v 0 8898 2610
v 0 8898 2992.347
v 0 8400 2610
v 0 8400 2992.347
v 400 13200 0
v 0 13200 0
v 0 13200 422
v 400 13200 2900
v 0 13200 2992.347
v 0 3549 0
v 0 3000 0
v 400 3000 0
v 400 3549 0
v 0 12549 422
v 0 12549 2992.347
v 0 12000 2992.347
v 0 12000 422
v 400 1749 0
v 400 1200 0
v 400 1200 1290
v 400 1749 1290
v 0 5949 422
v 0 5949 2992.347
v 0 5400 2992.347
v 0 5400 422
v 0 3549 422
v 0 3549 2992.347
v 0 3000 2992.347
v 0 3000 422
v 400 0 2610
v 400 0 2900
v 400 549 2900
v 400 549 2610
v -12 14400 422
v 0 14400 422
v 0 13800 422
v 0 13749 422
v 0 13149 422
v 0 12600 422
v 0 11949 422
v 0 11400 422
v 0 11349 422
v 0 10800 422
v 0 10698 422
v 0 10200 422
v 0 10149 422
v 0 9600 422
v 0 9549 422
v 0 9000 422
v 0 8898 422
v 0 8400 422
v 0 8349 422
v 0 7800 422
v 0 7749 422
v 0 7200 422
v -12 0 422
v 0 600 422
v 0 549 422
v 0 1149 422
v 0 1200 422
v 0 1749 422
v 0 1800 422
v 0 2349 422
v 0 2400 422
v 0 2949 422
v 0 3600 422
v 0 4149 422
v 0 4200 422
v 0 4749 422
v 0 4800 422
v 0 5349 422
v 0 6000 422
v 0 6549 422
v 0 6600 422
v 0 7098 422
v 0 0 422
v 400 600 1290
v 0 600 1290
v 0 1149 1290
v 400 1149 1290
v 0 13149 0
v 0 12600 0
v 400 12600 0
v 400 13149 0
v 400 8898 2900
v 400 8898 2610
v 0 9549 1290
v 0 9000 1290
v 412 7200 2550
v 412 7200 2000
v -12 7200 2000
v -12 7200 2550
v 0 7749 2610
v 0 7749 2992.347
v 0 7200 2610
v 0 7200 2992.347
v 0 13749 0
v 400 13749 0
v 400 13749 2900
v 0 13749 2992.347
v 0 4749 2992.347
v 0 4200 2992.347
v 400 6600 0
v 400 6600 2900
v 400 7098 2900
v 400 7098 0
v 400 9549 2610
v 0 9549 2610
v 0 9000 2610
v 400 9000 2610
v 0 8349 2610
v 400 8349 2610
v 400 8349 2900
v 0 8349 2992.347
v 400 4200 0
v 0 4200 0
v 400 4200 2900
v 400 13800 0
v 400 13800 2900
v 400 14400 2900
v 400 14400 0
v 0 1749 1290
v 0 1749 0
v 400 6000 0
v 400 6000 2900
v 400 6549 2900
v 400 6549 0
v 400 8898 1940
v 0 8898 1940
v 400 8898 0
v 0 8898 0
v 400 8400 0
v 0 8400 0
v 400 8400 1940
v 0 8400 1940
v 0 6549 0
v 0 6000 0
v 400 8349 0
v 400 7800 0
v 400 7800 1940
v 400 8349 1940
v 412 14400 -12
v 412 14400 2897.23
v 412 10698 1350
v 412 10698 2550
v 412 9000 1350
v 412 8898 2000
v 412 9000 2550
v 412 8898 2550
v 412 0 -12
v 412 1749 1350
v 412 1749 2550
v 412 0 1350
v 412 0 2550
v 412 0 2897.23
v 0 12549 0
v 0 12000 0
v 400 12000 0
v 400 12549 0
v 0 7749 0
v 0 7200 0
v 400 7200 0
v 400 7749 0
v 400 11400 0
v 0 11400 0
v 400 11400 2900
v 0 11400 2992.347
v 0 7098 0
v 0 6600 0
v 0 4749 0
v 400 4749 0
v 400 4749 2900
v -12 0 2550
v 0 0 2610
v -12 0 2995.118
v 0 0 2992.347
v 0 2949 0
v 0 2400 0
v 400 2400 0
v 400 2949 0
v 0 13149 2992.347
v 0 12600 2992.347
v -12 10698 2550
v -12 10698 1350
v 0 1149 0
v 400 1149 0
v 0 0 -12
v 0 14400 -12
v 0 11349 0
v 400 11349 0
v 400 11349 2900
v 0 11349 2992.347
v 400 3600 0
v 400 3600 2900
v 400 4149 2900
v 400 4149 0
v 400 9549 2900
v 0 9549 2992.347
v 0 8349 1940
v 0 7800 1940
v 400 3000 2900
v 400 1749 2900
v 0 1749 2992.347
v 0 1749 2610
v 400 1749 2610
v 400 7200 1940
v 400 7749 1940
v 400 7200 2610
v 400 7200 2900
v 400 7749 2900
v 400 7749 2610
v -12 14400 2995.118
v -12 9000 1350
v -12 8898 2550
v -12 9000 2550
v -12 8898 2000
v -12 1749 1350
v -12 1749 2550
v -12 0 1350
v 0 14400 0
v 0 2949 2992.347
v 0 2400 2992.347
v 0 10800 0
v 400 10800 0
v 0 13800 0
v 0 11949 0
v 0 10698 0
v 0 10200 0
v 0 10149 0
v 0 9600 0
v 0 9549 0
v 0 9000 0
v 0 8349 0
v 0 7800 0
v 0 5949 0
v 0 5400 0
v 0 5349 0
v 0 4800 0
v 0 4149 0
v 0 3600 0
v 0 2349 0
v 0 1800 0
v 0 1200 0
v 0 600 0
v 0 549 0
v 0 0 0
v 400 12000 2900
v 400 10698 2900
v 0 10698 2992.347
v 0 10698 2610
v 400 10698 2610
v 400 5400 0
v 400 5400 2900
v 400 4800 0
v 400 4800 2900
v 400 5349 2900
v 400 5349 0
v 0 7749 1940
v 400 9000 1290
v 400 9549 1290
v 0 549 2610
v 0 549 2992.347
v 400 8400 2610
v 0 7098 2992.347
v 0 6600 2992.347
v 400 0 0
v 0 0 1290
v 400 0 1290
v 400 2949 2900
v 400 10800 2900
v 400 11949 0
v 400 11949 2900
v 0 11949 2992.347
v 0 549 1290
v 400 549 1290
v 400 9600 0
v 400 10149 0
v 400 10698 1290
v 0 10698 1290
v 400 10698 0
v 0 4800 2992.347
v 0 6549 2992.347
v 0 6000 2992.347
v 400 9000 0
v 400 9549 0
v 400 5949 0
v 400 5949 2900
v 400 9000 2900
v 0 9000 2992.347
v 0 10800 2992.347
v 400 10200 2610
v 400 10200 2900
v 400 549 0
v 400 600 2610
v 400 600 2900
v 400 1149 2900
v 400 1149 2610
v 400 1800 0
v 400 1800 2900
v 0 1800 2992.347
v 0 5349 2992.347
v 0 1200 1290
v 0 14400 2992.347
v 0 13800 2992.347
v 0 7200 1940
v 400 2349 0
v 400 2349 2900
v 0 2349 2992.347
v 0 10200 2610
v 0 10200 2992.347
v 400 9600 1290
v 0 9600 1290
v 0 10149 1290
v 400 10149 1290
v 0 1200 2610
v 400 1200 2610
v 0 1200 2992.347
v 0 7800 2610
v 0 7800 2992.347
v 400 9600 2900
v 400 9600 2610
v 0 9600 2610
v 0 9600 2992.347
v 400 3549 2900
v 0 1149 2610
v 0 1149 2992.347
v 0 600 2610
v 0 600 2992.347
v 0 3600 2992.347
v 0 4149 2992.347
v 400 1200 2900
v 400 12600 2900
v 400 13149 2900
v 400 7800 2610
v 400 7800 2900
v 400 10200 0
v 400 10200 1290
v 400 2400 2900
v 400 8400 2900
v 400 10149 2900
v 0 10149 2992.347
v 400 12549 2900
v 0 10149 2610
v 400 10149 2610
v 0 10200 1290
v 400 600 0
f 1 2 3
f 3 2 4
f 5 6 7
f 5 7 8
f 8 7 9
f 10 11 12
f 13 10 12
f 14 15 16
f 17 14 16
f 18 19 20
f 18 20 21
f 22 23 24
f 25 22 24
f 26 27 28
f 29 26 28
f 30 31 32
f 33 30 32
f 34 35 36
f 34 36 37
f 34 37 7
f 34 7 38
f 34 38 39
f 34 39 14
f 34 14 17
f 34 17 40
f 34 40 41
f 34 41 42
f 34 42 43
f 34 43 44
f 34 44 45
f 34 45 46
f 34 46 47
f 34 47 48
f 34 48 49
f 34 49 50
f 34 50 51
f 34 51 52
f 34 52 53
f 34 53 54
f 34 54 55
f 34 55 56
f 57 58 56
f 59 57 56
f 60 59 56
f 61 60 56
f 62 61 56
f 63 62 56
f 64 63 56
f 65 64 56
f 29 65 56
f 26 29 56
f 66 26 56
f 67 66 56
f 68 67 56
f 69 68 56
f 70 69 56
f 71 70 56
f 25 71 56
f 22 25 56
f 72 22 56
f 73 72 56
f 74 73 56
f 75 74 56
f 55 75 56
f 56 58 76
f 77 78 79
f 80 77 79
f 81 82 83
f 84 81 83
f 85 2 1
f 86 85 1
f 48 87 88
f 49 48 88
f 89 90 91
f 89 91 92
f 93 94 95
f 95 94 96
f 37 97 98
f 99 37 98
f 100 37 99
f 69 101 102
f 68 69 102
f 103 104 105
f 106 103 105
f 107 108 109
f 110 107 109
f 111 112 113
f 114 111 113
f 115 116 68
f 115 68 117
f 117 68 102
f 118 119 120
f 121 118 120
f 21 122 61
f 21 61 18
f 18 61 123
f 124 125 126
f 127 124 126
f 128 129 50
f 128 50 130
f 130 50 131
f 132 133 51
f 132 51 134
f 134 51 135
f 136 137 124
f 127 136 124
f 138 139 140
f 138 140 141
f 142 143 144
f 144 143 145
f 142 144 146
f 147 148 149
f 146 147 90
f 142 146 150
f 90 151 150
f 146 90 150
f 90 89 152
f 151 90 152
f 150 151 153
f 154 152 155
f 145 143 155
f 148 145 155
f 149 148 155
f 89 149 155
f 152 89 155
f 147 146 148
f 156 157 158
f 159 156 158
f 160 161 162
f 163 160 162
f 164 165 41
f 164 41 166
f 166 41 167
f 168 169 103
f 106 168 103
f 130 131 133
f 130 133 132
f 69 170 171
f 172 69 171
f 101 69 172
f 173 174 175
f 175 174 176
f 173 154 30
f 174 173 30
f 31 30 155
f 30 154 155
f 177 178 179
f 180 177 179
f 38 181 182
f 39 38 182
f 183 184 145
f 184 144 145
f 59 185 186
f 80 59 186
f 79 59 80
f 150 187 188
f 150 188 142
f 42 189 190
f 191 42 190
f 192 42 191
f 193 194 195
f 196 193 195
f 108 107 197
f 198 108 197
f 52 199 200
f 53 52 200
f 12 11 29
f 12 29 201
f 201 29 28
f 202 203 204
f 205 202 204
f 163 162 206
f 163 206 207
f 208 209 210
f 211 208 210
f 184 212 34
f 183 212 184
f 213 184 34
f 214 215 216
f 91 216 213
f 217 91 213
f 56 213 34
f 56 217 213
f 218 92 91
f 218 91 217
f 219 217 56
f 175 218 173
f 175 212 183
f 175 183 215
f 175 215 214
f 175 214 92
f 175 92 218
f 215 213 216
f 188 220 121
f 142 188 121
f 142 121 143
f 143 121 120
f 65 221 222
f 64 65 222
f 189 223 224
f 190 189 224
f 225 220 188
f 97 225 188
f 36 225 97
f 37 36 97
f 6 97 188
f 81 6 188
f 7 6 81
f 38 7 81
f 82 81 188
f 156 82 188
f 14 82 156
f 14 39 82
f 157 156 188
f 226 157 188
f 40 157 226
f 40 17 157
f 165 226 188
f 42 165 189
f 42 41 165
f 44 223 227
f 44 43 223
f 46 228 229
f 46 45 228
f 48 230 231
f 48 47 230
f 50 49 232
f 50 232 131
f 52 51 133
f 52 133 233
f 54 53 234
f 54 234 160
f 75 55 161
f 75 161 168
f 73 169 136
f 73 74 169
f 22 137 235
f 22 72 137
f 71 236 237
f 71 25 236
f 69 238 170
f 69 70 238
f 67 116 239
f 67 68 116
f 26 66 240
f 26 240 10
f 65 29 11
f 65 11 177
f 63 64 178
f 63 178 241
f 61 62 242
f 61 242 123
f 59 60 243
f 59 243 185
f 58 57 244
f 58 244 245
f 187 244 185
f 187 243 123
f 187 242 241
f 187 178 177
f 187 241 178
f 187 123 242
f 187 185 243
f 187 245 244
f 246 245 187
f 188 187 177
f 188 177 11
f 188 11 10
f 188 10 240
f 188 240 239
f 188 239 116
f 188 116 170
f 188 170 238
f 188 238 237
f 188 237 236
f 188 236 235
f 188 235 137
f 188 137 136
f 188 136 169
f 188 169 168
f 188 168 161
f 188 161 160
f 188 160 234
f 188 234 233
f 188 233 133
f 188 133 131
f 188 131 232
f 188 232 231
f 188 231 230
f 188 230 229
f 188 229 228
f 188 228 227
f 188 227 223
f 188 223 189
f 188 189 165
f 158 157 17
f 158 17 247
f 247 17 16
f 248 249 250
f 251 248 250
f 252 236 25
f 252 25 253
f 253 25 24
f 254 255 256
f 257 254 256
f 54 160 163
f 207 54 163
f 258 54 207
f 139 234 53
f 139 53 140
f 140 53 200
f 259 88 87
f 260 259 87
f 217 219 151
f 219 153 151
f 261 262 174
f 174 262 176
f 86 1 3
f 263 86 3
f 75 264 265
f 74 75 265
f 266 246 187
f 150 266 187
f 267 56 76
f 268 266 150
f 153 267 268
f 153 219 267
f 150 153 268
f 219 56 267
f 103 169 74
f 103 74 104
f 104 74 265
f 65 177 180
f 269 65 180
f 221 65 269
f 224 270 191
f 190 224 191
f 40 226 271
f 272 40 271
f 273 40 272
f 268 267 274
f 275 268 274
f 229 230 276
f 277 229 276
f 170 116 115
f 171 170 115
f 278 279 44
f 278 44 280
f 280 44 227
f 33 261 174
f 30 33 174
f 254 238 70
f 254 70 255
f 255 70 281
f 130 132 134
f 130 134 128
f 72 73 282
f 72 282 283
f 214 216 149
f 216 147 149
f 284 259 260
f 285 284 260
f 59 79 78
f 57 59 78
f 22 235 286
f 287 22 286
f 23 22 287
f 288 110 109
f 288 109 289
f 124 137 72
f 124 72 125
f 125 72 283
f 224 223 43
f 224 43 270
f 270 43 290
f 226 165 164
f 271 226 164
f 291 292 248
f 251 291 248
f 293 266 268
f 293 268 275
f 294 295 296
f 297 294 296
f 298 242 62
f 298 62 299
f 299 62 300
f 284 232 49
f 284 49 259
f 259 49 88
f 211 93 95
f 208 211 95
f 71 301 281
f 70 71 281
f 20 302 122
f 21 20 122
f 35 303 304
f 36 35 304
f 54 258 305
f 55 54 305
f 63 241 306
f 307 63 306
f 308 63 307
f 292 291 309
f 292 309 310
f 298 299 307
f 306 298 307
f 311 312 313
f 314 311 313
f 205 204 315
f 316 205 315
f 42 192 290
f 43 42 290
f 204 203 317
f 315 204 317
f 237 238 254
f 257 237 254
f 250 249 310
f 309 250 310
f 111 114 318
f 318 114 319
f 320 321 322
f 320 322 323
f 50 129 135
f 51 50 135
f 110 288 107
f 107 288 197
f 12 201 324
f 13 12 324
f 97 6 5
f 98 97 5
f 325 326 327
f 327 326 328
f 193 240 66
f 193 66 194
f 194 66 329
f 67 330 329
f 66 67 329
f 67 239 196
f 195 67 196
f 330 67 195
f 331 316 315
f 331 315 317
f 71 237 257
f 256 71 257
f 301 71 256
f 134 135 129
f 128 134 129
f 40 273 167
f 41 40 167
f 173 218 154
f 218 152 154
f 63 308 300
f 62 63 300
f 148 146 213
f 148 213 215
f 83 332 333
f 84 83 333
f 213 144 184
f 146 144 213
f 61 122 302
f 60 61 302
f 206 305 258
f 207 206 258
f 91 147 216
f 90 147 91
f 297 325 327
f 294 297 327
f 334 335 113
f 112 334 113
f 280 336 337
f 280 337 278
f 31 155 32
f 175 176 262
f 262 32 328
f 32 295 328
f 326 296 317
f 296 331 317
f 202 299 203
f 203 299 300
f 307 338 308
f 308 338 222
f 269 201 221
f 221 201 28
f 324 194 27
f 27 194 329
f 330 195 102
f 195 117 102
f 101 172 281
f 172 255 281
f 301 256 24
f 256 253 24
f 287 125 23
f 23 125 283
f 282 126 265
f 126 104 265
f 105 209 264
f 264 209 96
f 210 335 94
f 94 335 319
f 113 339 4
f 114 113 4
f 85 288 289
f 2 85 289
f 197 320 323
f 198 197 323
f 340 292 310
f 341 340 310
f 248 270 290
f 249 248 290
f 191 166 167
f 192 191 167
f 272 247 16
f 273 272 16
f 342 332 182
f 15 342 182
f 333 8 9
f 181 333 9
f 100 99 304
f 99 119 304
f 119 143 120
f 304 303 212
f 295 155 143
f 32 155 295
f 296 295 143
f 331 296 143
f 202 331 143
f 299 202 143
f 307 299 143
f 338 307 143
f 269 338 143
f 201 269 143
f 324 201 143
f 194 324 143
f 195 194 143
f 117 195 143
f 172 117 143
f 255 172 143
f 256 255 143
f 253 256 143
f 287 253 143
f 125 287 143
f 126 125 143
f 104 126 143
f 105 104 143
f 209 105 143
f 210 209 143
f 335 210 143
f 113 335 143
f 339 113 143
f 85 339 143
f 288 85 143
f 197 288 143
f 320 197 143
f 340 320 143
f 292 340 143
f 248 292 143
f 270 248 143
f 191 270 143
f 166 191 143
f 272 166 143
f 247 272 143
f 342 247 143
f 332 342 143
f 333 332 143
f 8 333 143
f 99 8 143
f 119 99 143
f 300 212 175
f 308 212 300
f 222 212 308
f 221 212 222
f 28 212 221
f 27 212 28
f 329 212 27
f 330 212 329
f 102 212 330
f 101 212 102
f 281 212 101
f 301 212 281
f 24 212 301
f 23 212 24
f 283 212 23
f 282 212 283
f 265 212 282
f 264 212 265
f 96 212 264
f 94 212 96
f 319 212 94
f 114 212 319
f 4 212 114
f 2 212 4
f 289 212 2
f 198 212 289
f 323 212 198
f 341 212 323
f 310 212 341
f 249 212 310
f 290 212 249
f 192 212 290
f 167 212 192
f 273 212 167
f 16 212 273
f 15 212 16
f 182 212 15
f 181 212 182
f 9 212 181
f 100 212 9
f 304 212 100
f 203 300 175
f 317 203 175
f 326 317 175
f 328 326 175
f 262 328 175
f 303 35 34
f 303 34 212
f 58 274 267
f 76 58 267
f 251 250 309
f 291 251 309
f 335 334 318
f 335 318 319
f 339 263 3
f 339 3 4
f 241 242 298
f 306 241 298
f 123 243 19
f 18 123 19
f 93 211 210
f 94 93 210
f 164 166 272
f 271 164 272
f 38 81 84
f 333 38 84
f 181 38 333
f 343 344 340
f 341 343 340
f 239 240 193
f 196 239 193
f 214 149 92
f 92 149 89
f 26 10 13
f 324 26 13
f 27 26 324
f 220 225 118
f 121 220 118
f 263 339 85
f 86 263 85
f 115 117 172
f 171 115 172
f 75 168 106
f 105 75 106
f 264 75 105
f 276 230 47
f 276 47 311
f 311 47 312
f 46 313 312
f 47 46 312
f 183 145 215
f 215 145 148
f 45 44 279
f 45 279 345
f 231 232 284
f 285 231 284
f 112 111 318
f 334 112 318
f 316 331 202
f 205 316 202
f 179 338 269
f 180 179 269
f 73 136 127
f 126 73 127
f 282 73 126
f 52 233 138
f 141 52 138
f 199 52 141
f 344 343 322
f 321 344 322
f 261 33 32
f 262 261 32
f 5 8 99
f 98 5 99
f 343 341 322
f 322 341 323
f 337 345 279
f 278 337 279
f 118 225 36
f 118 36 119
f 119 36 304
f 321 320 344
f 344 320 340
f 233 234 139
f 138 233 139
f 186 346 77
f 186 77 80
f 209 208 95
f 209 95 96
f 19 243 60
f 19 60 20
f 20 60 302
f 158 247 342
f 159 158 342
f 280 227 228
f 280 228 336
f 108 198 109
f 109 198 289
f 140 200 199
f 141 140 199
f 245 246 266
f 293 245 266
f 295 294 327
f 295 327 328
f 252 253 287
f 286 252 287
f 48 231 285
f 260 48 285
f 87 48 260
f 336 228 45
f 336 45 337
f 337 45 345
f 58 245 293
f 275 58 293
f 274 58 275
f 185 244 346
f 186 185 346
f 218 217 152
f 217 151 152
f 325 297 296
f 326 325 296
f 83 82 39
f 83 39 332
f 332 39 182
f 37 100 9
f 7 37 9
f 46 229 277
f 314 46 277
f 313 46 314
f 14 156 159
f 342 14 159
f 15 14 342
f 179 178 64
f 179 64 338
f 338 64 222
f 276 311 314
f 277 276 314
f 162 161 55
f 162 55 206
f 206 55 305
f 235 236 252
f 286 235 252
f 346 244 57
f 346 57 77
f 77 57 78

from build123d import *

# Parameters (mm, degrees)
F0_W     = 51
F0_H     = 590
F0_H_2   = 1290
F1_DEPTH = 400
F0_H_3   = 3200
F0_H_4   = 1940
F2_W     = 549
F2_H     = 590
F2_H_2   = 1290
F2_W_2   = 12600
F2_H_3   = 3200
F2_W_3   = 1698
F2_H_4   = 1200
F2_H_5   = 550
F3_DEPTH = 12
F4_W     = 12600
F4_H     = 2778
F4_W_2   = 1698
F4_H_2   = 1200
F4_H_3   = 550
F4_W_3   = 549
F4_H_4   = 590
F4_H_5   = 868
F5_DEPTH = 12
F7_DEPTH = 14400.001
F8_W     = 412
F8_H     = 14400
F9_DEPTH = 12


# Not quite as in the source:
# - a feature names something its author has since deleted; it is built from what else it names


with BuildPart() as f1:
    # F0 (on Right) → F1 (new body)
    with BuildSketch(Plane.YZ):
        with Locations((574.5, 2905)):
            Rectangle(F0_W, F0_H)
        with Locations((1174.5, 2905)):
            Rectangle(F0_W, F0_H)
        Polygon((1749, 2550), (1749, 1350), (1749, 1290), (1749, 0), (1800, 0), (1800, 3200), (1749, 3200), (1749, 2610), align=None)
        Polygon((0, 2610), (0, 2550), (1740, 2550), (1749, 2550), (1749, 2610), (1200, 2610), (1149, 2610), (600, 2610), (549, 2610), align=None)
        Polygon((0, 1350), (0, 1290), (549, 1290), (600, 1290), (1149, 1290), (1200, 1290), (1749, 1290), (1749, 1350), (1740, 1350), align=None)
        with Locations((1174.5, 645)):
            Rectangle(F0_W, F0_H_2)
        with Locations((574.5, 645)):
            Rectangle(F0_W, F0_H_2)
    extrude(amount=F1_DEPTH)



with BuildPart() as f1b:
    # F0 (on Right) → F1, piece 2 (new body)
    with BuildSketch(Plane.YZ):
        with Locations((2374.5, 1600)):
            Rectangle(F0_W, F0_H_3)
    extrude(amount=F1_DEPTH)


with BuildPart() as f1c:
    # F0 (on Right) → F1, piece 3 (new body)
    with BuildSketch(Plane.YZ):
        with Locations((2974.5, 1600)):
            Rectangle(F0_W, F0_H_3)
    extrude(amount=F1_DEPTH)


with BuildPart() as f1d:
    # F0 (on Right) → F1, piece 4 (new body)
    with BuildSketch(Plane.YZ):
        with Locations((3574.5, 1600)):
            Rectangle(F0_W, F0_H_3)
    extrude(amount=F1_DEPTH)


with BuildPart() as f1e:
    # F0 (on Right) → F1, piece 5 (new body)
    with BuildSketch(Plane.YZ):
        with Locations((4174.5, 1600)):
            Rectangle(F0_W, F0_H_3)
    extrude(amount=F1_DEPTH)


with BuildPart() as f1f:
    # F0 (on Right) → F1, piece 6 (new body)
    with BuildSketch(Plane.YZ):
        with Locations((4774.5, 1600)):
            Rectangle(F0_W, F0_H_3)
    extrude(amount=F1_DEPTH)


with BuildPart() as f1g:
    # F0 (on Right) → F1, piece 7 (new body)
    with BuildSketch(Plane.YZ):
        with Locations((5374.5, 1600)):
            Rectangle(F0_W, F0_H_3)
    extrude(amount=F1_DEPTH)


with BuildPart() as f1h:
    # F0 (on Right) → F1, piece 8 (new body)
    with BuildSketch(Plane.YZ):
        with Locations((5974.5, 1600)):
            Rectangle(F0_W, F0_H_3)
    extrude(amount=F1_DEPTH)


with BuildPart() as f1i:
    # F0 (on Right) → F1, piece 9 (new body)
    with BuildSketch(Plane.YZ):
        with Locations((6574.5, 1600)):
            Rectangle(F0_W, F0_H_3)
    extrude(amount=F1_DEPTH)


with BuildPart() as f1j:
    # F0 (on Right) → F1, piece 10 (new body)
    with BuildSketch(Plane.YZ):
        with Locations((7774.5, 2905)):
            Rectangle(F0_W, F0_H)
        with Locations((8374.5, 2905)):
            Rectangle(F0_W, F0_H)
        with Locations((9574.5, 2905)):
            Rectangle(F0_W, F0_H)
        with Locations((10174.5, 2905)):
            Rectangle(F0_W, F0_H)
        with Locations((10774.5, 1600)):
            Rectangle(F0_W, F0_H_3)
        Polygon((7149, 3200), (7149, 0), (7200, 0), (7200, 1940), (7749, 1940), (7800, 1940), (8349, 1940), (8400, 1940), (8898, 1940), (8898, 2000), (7200, 2000), (7200, 2550), (7200, 2610), (7200, 3200), align=None)
        with Locations((7774.5, 970)):
            Rectangle(F0_W, F0_H_4)
        Polygon((9549, 2610), (9000, 2610), (9000, 2550), (10698, 2550), (10698, 2610), (10200, 2610), (10149, 2610), (9600, 2610), align=None)
        Polygon((8949, 3200), (8949, 0), (9000, 0), (9000, 1290), (9000, 1350), (9000, 2550), (9000, 2610), (9000, 3200), align=None)
        with Locations((9574.5, 645)):
            Rectangle(F0_W, F0_H_2)
        with Locations((7123.5, 1600)):
            Rectangle(F0_W, F0_H_3)
        Polygon((7749, 2610), (7200, 2610), (7200, 2550), (8898, 2550), (8898, 2610), (8400, 2610), (8349, 2610), (7800, 2610), align=None)
        Polygon((9000, 1350), (9000, 1290), (9549, 1290), (9600, 1290), (10149, 1290), (10200, 1290), (10698, 1290), (10698, 1350), align=None)
        Polygon((8898, 2610), (8898, 2550), (8898, 2000), (8898, 1940), (8898, 0), (8949, 0), (8949, 3200), (8898, 3200), align=None)
        with Locations((10174.5, 645)):
            Rectangle(F0_W, F0_H_2)
        Polygon((10698, 2550), (10698, 1350), (10698, 1290), (10698, 0), (10749, 0), (10749, 3200), (10698, 3200), (10698, 2610), align=None)
        with Locations((8374.5, 970)):
            Rectangle(F0_W, F0_H_4)
    extrude(amount=F1_DEPTH)


with BuildPart() as f1k:
    # F0 (on Right) → F1, piece 11 (new body)
    with BuildSketch(Plane.YZ):
        with Locations((11374.5, 1600)):
            Rectangle(F0_W, F0_H_3)
    extrude(amount=F1_DEPTH)


with BuildPart() as f1l:
    # F0 (on Right) → F1, piece 12 (new body)
    with BuildSketch(Plane.YZ):
        with Locations((11974.5, 1600)):
            Rectangle(F0_W, F0_H_3)
    extrude(amount=F1_DEPTH)


with BuildPart() as f1m:
    # F0 (on Right) → F1, piece 13 (new body)
    with BuildSketch(Plane.YZ):
        with Locations((12574.5, 1600)):
            Rectangle(F0_W, F0_H_3)
    extrude(amount=F1_DEPTH)


with BuildPart() as f1n:
    # F0 (on Right) → F1, piece 14 (new body)
    with BuildSketch(Plane.YZ):
        with Locations((13174.5, 1600)):
            Rectangle(F0_W, F0_H_3)
    extrude(amount=F1_DEPTH)


with BuildPart() as f1o:
    # F0 (on Right) → F1, piece 15 (new body)
    with BuildSketch(Plane.YZ):
        with Locations((13774.5, 1600)):
            Rectangle(F0_W, F0_H_3)
    extrude(amount=F1_DEPTH)


with BuildPart() as f1_1:
    add(f1.part)

    add(f1b.part)  # F3 merges F1b

    add(f1c.part)  # F3 merges F1c

    add(f1d.part)  # F3 merges F1d

    add(f1e.part)  # F3 merges F1e

    add(f1f.part)  # F3 merges F1f

    add(f1g.part)  # F3 merges F1g

    add(f1h.part)  # F3 merges F1h

    add(f1i.part)  # F3 merges F1i

    add(f1j.part)  # F3 merges F1j

    add(f1k.part)  # F3 merges F1k

    add(f1l.part)  # F3 merges F1l

    add(f1m.part)  # F3 merges F1m

    add(f1n.part)  # F3 merges F1n

    add(f1o.part)  # F3 merges F1o
    # F2 (on face) → F3 (join)
    with BuildSketch(Plane.YZ.offset(400)):
        with Locations((274.5, 2905)):
            Rectangle(F2_W, F2_H)
        Polygon((600, 3200), (549, 3200), (549, 2610), (0, 2610), (0, 2550), (1749, 2550), (1749, 1350), (0, 1350), (0, 1290), (549, 1290), (549, 0), (600, 0), (600, 1290), (1149, 1290), (1149, 0), (1200, 0), (1200, 1290), (1749, 1290), (1749, 0), (1800, 0), (1800, 3200), (1749, 3200), (1749, 2610), (1200, 2610), (1200, 3200), (1149, 3200), (1149, 2610), (600, 2610), align=None)
        with Locations((874.5, 2905)):
            Rectangle(F2_W, F2_H)
        with Locations((1474.5, 2905)):
            Rectangle(F2_W, F2_H)
        with Locations((274.5, 645)):
            Rectangle(F2_W, F2_H_2)
        with Locations((8100, 1600)):
            Rectangle(F2_W_2, F2_H_3)
        with Locations((9849, 1950)):
            Rectangle(F2_W_3, F2_H_4, mode=Mode.SUBTRACT)
        with Locations((8049, 2275)):
            Rectangle(F2_W_3, F2_H_5, mode=Mode.SUBTRACT)
        with Locations((874.5, 645)):
            Rectangle(F2_W, F2_H_2)
        with Locations((1474.5, 645)):
            Rectangle(F2_W, F2_H_2)
    extrude(amount=F3_DEPTH)

    # F4 (on face) → F5 (join)
    with BuildSketch(Plane(origin=(0, 0, 0), x_dir=(0, -1, 0), z_dir=(-1, 0, 0))):
        with Locations((-8100, 1811)):
            Rectangle(F4_W, F4_H)
        with Locations((-9849, 1950)):
            Rectangle(F4_W_2, F4_H_2, mode=Mode.SUBTRACT)
        with Locations((-8049, 2275)):
            Rectangle(F4_W_2, F4_H_3, mode=Mode.SUBTRACT)
        Polygon((-1749, 3200), (-1800, 3200), (-1800, 422), (-1749, 422), (-1749, 1290), (-1200, 1290), (-1200, 422), (-1149, 422), (-1149, 1290), (-600, 1290), (-600, 422), (-549, 422), (-549, 1290), (0, 1290), (0, 1350), (-1749, 1350), (-1749, 2550), (0, 2550), (0, 2610), (-549, 2610), (-549, 3200), (-600, 3200), (-600, 2610), (-1149, 2610), (-1149, 3200), (-1200, 3200), (-1200, 2610), (-1749, 2610), align=None)
        with Locations((-1474.5, 2905)):
            Rectangle(F4_W_3, F4_H_4)
        with Locations((-1474.5, 856)):
            Rectangle(F4_W_3, F4_H_5)
        with Locations((-874.5, 2905)):
            Rectangle(F4_W_3, F4_H_4)
        with Locations((-874.5, 856)):
            Rectangle(F4_W_3, F4_H_5)
        with Locations((-274.5, 2905)):
            Rectangle(F4_W_3, F4_H_4)
        with Locations((-274.5, 856)):
            Rectangle(F4_W_3, F4_H_5)
    extrude(amount=F5_DEPTH)

    # F6 (on face) → F7 (cut, through all)
    with BuildSketch(Plane(origin=(0, 14400, 0), x_dir=(-1, 0, 0), z_dir=(0, 1, 0))):
        Polygon((-400, 3200), (-400, 2900), (12, 2995.1176947437), (12, 3245.1176947437), (-422, 3245.1176947437), (-422, 2894.9208997952), (-412, 2897.2295817065), (-412, 3200), align=None)
        Polygon((-412, 2897.2295817065), (-400, 2900), (-400, 3200), (-412, 3200), align=None)
        Polygon((-452, 2887.9948540615), (-422, 2894.9208997952), (-422, 3245.1176947437), (-452, 3245.1176947437), align=None)
    extrude(amount=-F7_DEPTH, mode=Mode.SUBTRACT)

    # F8 (on face) → F9 (join)
    with BuildSketch(Plane(origin=(0, 0, 0), x_dir=(1, 0, 0), z_dir=(0, 0, -1))):
        with Locations((206, -7200)):
            Rectangle(F8_W, F8_H)
    extrude(amount=F9_DEPTH)


solid = f1_1.part
